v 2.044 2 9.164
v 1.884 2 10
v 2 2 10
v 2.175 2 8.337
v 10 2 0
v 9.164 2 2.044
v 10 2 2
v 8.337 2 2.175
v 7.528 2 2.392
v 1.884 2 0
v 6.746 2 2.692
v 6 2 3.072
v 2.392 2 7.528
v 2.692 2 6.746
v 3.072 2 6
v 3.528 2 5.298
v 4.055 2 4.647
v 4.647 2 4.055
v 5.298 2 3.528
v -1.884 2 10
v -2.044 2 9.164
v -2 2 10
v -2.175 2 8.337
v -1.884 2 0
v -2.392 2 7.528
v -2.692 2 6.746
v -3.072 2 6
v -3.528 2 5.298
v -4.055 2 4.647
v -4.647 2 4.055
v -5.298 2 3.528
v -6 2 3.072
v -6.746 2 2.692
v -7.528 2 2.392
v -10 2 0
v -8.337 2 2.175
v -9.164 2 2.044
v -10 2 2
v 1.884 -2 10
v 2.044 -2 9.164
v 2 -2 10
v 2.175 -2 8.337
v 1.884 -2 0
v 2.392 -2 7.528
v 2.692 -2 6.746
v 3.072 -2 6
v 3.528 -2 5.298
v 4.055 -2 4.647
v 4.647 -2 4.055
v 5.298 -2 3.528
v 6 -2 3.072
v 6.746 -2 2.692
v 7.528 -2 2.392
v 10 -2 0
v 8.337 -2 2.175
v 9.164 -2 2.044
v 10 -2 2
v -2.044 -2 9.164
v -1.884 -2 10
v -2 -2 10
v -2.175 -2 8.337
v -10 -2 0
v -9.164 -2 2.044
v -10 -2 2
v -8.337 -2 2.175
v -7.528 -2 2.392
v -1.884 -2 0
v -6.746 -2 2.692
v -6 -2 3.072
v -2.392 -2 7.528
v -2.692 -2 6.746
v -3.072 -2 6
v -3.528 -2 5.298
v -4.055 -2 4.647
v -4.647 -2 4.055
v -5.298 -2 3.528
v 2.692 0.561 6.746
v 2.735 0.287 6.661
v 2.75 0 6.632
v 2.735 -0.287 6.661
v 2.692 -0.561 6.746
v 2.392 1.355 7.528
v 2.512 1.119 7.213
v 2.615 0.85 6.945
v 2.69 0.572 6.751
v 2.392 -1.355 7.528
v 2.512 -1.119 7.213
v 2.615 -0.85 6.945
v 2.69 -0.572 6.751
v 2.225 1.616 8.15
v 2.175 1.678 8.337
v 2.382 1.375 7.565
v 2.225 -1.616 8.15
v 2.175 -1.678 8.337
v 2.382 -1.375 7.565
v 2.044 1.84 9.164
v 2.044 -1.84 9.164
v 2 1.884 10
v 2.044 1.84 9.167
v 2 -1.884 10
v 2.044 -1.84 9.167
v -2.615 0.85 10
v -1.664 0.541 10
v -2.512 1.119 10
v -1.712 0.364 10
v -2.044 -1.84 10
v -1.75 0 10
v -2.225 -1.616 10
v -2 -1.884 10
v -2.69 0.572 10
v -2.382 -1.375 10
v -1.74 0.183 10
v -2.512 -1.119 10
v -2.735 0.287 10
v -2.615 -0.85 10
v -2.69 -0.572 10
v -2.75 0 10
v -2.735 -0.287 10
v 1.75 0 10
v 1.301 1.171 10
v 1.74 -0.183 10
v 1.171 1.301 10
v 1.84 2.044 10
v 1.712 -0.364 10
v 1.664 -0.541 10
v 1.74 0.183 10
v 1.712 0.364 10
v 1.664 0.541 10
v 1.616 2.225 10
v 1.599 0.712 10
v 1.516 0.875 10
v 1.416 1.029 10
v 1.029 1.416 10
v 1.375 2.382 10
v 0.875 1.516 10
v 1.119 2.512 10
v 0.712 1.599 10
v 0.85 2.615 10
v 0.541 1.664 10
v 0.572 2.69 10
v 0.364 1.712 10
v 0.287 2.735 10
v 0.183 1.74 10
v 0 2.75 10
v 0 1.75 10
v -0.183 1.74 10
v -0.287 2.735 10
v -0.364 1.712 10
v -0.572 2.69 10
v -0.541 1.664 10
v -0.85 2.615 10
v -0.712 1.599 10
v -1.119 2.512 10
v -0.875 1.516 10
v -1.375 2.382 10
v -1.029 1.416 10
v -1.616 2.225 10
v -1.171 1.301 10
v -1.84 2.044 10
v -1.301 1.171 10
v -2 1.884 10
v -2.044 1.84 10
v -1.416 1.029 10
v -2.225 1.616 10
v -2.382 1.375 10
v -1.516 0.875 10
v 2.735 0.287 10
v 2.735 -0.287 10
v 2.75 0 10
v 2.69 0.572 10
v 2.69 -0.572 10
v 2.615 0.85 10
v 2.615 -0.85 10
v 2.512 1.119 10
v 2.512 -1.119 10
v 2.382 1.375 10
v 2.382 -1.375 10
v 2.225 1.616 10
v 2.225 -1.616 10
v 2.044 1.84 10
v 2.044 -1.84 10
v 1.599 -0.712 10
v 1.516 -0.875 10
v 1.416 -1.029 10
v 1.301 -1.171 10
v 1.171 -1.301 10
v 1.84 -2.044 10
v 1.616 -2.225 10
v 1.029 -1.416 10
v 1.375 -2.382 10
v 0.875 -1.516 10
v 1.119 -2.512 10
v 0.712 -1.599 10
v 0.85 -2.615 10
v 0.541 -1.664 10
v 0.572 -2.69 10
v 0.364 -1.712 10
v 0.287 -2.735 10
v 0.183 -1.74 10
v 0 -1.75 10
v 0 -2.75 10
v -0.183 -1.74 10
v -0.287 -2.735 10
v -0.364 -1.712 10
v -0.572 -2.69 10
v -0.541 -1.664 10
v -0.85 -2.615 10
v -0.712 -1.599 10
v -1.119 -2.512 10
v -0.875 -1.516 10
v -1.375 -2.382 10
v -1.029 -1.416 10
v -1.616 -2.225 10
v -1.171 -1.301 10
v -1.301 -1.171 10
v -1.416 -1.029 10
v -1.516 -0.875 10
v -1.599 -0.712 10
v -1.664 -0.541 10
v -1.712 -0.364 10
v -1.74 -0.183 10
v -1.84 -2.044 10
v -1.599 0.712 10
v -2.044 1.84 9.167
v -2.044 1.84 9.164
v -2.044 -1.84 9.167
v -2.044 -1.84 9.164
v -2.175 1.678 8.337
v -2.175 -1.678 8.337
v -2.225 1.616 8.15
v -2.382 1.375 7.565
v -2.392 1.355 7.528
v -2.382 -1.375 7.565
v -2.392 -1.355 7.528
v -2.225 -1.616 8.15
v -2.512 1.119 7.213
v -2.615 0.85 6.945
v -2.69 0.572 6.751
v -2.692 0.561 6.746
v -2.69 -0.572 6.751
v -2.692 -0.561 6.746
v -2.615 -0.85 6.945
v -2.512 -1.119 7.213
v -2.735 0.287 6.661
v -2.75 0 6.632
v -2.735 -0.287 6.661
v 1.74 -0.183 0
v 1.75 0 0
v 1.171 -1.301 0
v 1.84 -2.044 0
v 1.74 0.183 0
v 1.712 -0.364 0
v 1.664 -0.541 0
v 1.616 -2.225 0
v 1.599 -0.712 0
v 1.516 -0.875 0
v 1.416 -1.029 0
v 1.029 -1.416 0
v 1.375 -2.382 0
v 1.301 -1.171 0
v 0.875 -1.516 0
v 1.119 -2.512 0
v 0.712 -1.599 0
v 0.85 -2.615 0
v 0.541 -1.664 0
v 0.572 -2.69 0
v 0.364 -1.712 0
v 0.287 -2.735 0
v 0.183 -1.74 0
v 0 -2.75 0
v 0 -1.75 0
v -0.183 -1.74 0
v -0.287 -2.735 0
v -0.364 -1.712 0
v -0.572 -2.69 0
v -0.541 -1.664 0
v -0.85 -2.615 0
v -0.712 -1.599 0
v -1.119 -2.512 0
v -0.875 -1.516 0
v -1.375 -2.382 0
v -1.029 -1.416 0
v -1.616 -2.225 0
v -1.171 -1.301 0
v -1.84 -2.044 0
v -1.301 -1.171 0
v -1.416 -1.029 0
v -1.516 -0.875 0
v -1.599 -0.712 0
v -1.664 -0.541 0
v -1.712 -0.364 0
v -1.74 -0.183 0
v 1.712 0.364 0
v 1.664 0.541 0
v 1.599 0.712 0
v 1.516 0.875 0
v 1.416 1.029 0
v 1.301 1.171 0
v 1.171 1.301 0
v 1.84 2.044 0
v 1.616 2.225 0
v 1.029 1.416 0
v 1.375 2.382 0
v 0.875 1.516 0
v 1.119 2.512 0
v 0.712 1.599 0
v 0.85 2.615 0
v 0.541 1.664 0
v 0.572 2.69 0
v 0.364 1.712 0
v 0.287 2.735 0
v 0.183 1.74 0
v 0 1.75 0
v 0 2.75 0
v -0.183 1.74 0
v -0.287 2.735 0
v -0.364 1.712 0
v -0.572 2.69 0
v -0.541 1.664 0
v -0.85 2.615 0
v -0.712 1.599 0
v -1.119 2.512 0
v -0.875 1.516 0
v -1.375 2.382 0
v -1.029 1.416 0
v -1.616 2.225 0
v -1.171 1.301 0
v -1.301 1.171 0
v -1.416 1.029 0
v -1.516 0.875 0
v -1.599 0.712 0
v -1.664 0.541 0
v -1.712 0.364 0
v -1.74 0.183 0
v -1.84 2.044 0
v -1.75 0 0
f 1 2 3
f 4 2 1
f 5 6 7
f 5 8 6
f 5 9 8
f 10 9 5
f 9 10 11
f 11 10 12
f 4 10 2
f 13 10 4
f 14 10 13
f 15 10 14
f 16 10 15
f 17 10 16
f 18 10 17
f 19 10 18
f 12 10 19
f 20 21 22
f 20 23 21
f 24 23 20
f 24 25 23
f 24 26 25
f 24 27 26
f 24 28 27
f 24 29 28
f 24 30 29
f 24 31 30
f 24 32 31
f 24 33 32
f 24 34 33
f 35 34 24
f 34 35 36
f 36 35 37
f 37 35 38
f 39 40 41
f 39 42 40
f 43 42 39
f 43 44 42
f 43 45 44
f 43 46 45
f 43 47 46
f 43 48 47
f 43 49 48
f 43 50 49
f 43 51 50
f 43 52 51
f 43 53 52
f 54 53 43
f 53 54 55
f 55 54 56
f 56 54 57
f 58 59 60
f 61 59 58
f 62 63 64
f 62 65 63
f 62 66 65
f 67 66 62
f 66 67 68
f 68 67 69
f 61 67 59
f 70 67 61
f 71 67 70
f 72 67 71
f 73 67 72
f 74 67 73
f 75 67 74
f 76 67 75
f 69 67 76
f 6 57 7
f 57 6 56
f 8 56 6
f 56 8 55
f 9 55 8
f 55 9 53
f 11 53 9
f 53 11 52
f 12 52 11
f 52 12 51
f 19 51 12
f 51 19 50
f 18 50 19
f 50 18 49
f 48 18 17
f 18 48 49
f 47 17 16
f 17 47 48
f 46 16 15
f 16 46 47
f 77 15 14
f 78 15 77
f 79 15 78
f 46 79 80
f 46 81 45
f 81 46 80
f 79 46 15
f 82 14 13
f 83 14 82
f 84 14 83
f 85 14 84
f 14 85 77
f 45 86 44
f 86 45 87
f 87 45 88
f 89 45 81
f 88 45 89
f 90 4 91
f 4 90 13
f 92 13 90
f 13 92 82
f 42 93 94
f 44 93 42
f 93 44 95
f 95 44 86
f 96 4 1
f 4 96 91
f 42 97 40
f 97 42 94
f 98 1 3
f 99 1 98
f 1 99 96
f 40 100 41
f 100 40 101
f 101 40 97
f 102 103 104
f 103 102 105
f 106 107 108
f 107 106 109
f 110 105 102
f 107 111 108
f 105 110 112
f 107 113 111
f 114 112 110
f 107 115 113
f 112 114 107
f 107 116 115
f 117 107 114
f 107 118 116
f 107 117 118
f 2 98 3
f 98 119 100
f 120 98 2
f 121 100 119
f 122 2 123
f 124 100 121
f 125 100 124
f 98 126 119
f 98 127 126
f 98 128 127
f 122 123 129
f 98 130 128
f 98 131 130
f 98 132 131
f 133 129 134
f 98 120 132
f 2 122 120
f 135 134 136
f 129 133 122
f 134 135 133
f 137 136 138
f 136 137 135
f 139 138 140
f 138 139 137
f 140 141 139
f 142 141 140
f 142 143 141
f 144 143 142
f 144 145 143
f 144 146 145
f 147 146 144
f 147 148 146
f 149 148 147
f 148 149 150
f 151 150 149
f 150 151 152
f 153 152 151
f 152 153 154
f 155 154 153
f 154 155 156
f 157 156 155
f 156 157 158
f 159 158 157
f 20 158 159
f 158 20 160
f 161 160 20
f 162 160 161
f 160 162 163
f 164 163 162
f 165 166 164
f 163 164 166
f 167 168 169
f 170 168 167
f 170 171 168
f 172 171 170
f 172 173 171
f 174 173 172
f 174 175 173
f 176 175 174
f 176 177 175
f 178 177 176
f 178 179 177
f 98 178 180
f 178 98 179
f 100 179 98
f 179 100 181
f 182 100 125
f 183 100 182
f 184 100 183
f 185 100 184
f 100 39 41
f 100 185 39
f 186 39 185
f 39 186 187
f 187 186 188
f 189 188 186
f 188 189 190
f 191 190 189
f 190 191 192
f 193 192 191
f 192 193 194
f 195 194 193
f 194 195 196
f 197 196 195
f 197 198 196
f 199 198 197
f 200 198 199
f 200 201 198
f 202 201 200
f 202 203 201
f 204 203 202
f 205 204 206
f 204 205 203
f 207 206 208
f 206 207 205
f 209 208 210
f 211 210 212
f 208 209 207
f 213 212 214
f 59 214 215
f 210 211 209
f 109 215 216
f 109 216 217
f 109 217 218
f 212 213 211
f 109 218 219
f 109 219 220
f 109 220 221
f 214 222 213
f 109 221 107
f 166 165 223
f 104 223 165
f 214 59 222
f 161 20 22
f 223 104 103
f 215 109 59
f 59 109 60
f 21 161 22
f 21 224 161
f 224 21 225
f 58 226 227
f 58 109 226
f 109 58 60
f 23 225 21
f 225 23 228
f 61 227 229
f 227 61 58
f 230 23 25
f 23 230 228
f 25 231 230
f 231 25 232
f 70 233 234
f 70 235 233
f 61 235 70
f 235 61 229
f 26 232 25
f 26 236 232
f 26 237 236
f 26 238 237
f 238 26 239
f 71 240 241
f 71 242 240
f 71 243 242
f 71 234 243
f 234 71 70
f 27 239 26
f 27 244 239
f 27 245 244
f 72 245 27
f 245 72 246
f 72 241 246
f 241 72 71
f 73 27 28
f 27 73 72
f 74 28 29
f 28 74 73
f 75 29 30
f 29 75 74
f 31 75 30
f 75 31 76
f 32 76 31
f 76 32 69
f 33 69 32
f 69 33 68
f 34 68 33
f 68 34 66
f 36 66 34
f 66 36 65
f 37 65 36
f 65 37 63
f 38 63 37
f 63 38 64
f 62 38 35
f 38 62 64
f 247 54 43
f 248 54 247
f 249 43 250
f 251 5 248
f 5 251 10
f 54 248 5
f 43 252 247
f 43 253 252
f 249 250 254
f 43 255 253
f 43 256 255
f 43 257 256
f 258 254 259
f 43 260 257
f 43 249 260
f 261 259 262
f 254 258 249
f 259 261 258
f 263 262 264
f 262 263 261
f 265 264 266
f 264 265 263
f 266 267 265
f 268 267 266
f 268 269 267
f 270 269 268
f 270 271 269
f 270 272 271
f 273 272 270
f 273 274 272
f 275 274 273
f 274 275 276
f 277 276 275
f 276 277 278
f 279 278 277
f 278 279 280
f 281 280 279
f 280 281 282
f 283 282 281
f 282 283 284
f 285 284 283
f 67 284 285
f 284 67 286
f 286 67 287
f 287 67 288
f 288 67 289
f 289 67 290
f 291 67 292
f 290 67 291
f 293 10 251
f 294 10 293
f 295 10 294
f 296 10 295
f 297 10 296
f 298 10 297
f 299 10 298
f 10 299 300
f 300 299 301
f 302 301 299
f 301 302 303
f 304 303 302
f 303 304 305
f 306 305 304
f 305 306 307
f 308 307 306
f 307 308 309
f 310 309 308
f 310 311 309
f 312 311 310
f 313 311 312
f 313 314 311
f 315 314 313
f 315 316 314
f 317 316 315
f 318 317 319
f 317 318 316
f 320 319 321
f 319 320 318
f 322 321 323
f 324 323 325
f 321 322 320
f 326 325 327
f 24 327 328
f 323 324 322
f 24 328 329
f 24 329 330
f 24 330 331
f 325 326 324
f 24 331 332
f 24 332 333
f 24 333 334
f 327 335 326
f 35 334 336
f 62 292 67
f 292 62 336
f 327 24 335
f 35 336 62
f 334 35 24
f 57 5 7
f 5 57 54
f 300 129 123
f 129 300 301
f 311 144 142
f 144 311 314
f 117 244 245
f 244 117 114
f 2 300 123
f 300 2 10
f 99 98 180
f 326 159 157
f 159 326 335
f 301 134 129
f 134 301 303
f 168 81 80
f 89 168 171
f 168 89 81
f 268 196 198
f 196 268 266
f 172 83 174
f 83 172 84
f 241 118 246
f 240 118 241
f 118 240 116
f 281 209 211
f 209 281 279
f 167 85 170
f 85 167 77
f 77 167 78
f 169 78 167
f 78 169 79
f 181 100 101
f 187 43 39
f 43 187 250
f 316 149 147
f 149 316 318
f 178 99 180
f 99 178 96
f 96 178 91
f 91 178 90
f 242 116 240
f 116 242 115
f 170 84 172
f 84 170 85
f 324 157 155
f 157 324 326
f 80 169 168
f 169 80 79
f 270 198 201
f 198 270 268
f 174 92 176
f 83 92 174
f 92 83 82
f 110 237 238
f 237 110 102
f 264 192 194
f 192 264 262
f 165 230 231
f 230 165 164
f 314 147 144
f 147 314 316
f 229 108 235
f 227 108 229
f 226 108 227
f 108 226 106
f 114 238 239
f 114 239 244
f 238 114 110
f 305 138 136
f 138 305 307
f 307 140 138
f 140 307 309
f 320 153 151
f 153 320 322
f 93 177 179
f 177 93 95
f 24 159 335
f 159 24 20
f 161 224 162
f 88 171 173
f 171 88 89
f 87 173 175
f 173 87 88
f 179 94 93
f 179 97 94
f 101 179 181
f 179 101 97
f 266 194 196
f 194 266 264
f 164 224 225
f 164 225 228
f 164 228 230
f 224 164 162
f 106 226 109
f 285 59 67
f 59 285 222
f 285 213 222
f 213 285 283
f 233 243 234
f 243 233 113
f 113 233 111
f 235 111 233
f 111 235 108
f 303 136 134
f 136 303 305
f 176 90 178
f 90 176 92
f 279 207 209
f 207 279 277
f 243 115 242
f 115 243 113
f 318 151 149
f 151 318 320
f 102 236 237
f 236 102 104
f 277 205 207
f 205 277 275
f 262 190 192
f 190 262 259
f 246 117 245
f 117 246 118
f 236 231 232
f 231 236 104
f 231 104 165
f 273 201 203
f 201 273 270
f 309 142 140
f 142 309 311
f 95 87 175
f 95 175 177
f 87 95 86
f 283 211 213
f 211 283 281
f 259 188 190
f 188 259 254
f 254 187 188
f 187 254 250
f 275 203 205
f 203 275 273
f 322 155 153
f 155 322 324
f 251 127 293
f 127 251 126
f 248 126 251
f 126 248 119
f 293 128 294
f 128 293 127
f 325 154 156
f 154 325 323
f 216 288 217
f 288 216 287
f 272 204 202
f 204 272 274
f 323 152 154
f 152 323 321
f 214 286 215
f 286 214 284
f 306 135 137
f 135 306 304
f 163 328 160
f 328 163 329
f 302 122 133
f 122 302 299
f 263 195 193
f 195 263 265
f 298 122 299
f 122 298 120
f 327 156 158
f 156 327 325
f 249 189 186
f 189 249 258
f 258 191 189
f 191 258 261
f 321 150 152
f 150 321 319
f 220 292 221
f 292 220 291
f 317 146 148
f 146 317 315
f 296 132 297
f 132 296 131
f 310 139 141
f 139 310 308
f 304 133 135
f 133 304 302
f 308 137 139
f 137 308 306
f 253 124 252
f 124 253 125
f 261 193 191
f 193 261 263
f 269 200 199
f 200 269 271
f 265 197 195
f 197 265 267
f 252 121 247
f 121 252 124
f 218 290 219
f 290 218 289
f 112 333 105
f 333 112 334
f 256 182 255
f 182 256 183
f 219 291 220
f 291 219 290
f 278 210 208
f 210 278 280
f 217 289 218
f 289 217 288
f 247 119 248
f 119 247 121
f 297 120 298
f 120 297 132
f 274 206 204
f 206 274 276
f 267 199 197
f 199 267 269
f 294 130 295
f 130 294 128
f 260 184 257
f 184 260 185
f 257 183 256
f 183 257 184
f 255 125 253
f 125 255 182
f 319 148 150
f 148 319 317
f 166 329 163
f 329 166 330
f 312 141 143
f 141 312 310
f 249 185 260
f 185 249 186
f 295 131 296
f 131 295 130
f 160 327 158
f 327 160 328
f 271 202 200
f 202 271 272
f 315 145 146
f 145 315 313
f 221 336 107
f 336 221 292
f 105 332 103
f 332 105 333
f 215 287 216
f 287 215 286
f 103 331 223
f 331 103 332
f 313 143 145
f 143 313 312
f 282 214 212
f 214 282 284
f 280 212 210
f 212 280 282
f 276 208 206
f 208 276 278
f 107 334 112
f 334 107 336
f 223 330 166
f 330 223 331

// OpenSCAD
screw_bottom();

module screw_bottom()
{
  height = 10;
  width = 20;
  screw = 4;


  difference()
  {    
    union()
    {
      translate([0,2,0])
        rotate([90,0,0])
          linear_extrude(screw)
          {
            difference()
            {
              translate([0,height/2,0])
                square([width, height], center=true);
              translate([width/2,height,0])
                circle(r=(width-screw)/2, $fn=60);
              translate([-(width/2),height,0])
                circle(r=(width-screw)/2, $fn=60);
            }
          }
    translate([0,0,height/2])
      cylinder(d=5.5, height, $fn=60, center=true);
    }
    translate([0,0,height/2])
      cylinder(d=3.5, height+1, $fn=60, center=true);
    
  }
}
